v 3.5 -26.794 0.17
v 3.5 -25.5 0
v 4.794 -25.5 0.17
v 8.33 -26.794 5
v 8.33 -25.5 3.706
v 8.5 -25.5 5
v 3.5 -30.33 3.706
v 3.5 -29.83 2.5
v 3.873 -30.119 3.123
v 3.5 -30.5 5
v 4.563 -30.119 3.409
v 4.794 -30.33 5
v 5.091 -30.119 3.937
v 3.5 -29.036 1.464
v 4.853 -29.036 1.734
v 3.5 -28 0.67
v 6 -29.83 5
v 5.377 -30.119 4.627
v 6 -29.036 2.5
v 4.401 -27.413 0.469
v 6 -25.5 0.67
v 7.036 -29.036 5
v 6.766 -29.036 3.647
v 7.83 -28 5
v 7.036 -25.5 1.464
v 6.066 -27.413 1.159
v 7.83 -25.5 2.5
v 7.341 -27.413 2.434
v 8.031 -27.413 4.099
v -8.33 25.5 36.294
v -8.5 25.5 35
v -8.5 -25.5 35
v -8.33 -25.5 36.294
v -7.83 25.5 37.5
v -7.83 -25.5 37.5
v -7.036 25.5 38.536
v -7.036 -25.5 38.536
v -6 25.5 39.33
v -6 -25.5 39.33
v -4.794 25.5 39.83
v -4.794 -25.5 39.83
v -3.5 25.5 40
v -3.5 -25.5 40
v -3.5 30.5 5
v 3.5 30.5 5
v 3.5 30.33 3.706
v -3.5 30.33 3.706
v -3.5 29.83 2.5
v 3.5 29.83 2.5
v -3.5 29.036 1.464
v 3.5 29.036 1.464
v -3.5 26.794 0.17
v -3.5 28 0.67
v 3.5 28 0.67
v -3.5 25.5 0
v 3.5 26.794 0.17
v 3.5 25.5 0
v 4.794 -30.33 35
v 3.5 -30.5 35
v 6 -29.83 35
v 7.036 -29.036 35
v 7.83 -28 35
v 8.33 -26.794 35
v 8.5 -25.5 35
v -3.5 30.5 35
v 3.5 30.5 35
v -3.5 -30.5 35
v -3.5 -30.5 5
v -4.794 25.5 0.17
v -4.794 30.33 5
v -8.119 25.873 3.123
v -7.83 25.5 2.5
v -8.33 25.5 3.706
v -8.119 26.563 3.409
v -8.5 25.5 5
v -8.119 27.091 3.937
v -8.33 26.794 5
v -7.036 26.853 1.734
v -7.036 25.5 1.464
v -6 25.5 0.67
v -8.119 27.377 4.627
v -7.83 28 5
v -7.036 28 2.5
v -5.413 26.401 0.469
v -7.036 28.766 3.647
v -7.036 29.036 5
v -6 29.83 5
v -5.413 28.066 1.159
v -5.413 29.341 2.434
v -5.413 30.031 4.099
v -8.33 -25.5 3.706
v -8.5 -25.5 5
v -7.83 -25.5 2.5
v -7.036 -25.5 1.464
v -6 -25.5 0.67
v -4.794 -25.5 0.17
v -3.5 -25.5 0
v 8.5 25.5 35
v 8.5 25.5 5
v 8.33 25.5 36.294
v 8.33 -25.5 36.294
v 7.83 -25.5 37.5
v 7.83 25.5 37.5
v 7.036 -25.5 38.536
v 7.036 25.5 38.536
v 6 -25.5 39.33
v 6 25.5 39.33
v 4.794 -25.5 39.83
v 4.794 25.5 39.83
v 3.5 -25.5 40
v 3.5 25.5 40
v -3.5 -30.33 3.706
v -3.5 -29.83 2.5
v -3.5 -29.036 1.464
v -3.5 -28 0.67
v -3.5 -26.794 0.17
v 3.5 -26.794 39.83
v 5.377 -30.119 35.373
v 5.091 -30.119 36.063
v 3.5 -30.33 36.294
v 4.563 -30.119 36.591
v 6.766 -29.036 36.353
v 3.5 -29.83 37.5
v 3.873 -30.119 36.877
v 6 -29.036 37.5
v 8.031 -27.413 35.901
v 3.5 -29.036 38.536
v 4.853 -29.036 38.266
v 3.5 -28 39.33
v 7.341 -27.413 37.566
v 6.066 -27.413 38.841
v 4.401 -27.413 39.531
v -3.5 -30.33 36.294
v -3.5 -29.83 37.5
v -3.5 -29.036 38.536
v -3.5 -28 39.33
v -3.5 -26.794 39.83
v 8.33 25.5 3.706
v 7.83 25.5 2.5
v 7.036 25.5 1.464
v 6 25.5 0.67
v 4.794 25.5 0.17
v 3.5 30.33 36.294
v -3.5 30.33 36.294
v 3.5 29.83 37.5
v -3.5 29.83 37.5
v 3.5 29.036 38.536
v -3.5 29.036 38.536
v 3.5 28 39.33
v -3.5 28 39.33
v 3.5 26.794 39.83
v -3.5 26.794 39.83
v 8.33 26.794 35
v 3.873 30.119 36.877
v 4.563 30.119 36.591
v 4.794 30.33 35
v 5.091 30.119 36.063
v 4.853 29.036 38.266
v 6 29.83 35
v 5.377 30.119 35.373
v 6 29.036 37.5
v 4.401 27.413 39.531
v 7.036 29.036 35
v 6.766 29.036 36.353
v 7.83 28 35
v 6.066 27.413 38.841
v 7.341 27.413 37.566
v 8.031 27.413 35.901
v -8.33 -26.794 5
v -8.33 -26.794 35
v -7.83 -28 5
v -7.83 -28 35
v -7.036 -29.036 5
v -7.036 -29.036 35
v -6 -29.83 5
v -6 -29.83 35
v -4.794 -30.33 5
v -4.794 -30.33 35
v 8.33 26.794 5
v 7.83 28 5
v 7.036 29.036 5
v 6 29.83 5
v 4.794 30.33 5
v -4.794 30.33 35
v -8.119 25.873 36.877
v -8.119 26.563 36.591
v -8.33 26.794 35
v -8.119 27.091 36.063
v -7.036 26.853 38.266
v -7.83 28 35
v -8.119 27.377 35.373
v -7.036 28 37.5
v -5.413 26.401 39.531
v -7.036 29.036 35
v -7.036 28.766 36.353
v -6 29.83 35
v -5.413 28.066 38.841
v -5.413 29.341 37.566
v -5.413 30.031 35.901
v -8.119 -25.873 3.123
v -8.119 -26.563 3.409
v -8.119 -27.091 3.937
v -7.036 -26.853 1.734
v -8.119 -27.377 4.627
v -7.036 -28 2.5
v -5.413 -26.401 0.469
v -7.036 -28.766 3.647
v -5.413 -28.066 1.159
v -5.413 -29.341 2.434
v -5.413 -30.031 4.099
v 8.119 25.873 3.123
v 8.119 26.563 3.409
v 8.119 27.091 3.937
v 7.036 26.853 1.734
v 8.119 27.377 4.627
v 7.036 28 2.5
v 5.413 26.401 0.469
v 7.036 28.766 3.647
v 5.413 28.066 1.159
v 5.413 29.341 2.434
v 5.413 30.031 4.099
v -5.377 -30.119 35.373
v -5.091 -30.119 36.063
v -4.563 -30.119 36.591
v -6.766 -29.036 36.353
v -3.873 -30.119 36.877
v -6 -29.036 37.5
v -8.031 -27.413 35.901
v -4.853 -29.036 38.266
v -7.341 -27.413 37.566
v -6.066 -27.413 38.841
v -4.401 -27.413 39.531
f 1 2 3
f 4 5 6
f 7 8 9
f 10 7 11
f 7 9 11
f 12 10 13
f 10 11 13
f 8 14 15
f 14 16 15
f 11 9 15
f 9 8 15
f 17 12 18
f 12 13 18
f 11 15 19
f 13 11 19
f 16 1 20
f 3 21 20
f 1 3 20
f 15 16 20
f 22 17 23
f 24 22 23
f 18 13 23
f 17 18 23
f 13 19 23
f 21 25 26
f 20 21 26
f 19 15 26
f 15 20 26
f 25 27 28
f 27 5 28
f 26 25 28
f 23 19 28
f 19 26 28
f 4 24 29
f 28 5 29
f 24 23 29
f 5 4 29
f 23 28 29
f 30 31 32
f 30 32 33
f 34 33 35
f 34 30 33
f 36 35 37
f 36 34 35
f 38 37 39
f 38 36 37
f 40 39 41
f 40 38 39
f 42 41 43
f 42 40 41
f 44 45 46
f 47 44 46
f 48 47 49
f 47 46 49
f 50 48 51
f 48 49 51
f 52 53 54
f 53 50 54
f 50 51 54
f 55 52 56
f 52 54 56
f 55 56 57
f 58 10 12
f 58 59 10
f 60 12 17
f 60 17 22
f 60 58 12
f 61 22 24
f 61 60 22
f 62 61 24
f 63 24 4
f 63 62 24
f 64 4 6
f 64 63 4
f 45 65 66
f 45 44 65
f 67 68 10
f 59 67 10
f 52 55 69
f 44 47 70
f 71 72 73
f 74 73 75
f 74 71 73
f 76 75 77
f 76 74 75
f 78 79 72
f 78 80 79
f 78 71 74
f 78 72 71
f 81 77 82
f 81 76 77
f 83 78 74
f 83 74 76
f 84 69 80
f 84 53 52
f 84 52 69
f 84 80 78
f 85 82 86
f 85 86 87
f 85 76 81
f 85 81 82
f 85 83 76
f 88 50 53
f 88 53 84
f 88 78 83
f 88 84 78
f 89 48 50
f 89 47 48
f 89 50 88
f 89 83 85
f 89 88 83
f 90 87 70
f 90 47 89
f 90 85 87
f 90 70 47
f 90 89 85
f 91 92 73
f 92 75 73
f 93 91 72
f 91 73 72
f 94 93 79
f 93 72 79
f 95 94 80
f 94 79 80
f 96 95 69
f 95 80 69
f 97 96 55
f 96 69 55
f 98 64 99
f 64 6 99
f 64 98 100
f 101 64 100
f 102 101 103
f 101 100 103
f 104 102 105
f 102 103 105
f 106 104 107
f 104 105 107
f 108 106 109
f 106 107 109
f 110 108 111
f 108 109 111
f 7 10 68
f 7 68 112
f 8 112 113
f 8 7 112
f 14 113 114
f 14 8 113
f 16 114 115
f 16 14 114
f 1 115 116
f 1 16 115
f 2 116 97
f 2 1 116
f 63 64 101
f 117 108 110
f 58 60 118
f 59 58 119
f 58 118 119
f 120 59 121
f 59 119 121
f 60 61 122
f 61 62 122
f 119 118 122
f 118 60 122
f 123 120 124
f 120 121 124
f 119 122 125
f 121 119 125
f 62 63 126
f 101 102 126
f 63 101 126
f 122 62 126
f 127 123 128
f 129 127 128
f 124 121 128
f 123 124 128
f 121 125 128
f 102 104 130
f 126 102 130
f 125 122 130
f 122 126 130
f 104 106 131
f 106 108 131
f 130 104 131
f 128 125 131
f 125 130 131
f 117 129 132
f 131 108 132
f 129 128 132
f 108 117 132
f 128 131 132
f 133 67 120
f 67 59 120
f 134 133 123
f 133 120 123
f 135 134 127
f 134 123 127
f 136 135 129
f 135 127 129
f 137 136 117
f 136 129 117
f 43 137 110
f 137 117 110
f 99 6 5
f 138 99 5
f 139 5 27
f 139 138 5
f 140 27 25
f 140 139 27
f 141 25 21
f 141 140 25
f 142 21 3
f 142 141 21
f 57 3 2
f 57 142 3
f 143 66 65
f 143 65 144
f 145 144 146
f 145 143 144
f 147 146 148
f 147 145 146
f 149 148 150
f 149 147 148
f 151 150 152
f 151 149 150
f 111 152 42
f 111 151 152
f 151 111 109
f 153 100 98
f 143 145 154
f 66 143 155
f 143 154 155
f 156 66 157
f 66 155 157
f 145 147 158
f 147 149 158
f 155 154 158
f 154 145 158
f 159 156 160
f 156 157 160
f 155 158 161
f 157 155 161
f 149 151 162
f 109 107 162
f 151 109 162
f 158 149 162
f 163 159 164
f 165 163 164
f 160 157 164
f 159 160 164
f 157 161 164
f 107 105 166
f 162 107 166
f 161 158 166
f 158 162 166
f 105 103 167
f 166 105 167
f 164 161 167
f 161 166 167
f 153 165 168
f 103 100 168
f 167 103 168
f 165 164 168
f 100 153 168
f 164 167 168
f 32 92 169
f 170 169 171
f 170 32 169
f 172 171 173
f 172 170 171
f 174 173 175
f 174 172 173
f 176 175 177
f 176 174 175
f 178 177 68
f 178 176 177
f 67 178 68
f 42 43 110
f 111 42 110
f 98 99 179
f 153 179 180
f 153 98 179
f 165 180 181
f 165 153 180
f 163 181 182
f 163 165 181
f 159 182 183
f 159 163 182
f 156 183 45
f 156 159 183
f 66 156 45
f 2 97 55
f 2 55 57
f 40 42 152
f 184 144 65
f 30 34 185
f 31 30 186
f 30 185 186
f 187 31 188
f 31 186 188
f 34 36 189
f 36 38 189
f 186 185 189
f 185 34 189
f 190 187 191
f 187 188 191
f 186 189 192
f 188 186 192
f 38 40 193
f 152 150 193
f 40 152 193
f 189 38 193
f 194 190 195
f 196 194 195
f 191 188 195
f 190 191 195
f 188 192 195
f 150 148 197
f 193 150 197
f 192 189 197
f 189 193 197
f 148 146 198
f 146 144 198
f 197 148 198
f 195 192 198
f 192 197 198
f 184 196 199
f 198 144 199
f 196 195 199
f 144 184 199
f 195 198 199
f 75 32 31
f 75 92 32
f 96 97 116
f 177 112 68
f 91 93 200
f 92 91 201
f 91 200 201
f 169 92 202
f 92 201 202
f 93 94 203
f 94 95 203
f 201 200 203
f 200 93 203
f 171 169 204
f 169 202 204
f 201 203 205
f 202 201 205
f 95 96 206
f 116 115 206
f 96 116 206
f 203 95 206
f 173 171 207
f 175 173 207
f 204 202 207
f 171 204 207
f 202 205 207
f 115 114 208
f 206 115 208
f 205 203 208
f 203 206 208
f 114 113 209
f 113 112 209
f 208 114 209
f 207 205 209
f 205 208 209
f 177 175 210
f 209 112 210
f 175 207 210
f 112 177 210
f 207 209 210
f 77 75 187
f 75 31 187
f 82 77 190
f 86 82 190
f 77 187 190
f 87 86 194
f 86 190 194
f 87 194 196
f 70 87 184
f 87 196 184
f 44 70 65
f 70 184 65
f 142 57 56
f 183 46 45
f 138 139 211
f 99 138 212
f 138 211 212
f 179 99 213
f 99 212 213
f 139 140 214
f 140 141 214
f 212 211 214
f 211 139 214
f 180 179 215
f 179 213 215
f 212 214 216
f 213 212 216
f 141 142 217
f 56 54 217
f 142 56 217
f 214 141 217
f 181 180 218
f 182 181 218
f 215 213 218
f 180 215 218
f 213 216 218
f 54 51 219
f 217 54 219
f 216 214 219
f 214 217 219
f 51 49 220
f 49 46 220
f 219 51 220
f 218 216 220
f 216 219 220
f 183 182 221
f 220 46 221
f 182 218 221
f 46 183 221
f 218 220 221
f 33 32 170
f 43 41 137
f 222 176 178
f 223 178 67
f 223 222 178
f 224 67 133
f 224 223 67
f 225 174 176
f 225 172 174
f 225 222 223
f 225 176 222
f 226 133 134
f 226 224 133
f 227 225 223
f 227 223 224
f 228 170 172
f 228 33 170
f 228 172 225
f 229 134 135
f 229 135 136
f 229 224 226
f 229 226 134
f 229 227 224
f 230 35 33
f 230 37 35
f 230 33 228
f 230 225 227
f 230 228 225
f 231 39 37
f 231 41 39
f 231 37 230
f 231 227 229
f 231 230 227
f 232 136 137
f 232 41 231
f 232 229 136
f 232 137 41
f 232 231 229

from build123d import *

# Parameters (mm, degrees)
FRONTSKETCH_W       = 17
FRONTSKETCH_H       = 61
BOSS_EXTRUDE1_DEPTH = 40
FILLET1_R           = 5


with BuildPart() as part:
    # FrontSketch → Boss-Extrude1 (new body)
    with BuildSketch(Plane.XY):
        Rectangle(FRONTSKETCH_W, FRONTSKETCH_H)
    extrude(amount=BOSS_EXTRUDE1_DEPTH)

    # Fillet1
    fillet1_edges = [part.edges().sort_by_distance(p)[0] for p in [
        (8.5, 0, 40),
        (0, 30.5, 40),
        (-8.5, 0, 40),
        (0, 30.5, 0),
        (8.5, 0, 0),
        (0, -30.5, 0),
        (-8.5, 0, 0),
        (-8.5, 30.5, 20),
        (8.5, 30.5, 20),
        (8.5, -30.5, 20),
        (-8.5, -30.5, 20),
        (0, -30.5, 40),
    ]]
    fillet(fillet1_edges, radius=FILLET1_R)


solid = part.part
